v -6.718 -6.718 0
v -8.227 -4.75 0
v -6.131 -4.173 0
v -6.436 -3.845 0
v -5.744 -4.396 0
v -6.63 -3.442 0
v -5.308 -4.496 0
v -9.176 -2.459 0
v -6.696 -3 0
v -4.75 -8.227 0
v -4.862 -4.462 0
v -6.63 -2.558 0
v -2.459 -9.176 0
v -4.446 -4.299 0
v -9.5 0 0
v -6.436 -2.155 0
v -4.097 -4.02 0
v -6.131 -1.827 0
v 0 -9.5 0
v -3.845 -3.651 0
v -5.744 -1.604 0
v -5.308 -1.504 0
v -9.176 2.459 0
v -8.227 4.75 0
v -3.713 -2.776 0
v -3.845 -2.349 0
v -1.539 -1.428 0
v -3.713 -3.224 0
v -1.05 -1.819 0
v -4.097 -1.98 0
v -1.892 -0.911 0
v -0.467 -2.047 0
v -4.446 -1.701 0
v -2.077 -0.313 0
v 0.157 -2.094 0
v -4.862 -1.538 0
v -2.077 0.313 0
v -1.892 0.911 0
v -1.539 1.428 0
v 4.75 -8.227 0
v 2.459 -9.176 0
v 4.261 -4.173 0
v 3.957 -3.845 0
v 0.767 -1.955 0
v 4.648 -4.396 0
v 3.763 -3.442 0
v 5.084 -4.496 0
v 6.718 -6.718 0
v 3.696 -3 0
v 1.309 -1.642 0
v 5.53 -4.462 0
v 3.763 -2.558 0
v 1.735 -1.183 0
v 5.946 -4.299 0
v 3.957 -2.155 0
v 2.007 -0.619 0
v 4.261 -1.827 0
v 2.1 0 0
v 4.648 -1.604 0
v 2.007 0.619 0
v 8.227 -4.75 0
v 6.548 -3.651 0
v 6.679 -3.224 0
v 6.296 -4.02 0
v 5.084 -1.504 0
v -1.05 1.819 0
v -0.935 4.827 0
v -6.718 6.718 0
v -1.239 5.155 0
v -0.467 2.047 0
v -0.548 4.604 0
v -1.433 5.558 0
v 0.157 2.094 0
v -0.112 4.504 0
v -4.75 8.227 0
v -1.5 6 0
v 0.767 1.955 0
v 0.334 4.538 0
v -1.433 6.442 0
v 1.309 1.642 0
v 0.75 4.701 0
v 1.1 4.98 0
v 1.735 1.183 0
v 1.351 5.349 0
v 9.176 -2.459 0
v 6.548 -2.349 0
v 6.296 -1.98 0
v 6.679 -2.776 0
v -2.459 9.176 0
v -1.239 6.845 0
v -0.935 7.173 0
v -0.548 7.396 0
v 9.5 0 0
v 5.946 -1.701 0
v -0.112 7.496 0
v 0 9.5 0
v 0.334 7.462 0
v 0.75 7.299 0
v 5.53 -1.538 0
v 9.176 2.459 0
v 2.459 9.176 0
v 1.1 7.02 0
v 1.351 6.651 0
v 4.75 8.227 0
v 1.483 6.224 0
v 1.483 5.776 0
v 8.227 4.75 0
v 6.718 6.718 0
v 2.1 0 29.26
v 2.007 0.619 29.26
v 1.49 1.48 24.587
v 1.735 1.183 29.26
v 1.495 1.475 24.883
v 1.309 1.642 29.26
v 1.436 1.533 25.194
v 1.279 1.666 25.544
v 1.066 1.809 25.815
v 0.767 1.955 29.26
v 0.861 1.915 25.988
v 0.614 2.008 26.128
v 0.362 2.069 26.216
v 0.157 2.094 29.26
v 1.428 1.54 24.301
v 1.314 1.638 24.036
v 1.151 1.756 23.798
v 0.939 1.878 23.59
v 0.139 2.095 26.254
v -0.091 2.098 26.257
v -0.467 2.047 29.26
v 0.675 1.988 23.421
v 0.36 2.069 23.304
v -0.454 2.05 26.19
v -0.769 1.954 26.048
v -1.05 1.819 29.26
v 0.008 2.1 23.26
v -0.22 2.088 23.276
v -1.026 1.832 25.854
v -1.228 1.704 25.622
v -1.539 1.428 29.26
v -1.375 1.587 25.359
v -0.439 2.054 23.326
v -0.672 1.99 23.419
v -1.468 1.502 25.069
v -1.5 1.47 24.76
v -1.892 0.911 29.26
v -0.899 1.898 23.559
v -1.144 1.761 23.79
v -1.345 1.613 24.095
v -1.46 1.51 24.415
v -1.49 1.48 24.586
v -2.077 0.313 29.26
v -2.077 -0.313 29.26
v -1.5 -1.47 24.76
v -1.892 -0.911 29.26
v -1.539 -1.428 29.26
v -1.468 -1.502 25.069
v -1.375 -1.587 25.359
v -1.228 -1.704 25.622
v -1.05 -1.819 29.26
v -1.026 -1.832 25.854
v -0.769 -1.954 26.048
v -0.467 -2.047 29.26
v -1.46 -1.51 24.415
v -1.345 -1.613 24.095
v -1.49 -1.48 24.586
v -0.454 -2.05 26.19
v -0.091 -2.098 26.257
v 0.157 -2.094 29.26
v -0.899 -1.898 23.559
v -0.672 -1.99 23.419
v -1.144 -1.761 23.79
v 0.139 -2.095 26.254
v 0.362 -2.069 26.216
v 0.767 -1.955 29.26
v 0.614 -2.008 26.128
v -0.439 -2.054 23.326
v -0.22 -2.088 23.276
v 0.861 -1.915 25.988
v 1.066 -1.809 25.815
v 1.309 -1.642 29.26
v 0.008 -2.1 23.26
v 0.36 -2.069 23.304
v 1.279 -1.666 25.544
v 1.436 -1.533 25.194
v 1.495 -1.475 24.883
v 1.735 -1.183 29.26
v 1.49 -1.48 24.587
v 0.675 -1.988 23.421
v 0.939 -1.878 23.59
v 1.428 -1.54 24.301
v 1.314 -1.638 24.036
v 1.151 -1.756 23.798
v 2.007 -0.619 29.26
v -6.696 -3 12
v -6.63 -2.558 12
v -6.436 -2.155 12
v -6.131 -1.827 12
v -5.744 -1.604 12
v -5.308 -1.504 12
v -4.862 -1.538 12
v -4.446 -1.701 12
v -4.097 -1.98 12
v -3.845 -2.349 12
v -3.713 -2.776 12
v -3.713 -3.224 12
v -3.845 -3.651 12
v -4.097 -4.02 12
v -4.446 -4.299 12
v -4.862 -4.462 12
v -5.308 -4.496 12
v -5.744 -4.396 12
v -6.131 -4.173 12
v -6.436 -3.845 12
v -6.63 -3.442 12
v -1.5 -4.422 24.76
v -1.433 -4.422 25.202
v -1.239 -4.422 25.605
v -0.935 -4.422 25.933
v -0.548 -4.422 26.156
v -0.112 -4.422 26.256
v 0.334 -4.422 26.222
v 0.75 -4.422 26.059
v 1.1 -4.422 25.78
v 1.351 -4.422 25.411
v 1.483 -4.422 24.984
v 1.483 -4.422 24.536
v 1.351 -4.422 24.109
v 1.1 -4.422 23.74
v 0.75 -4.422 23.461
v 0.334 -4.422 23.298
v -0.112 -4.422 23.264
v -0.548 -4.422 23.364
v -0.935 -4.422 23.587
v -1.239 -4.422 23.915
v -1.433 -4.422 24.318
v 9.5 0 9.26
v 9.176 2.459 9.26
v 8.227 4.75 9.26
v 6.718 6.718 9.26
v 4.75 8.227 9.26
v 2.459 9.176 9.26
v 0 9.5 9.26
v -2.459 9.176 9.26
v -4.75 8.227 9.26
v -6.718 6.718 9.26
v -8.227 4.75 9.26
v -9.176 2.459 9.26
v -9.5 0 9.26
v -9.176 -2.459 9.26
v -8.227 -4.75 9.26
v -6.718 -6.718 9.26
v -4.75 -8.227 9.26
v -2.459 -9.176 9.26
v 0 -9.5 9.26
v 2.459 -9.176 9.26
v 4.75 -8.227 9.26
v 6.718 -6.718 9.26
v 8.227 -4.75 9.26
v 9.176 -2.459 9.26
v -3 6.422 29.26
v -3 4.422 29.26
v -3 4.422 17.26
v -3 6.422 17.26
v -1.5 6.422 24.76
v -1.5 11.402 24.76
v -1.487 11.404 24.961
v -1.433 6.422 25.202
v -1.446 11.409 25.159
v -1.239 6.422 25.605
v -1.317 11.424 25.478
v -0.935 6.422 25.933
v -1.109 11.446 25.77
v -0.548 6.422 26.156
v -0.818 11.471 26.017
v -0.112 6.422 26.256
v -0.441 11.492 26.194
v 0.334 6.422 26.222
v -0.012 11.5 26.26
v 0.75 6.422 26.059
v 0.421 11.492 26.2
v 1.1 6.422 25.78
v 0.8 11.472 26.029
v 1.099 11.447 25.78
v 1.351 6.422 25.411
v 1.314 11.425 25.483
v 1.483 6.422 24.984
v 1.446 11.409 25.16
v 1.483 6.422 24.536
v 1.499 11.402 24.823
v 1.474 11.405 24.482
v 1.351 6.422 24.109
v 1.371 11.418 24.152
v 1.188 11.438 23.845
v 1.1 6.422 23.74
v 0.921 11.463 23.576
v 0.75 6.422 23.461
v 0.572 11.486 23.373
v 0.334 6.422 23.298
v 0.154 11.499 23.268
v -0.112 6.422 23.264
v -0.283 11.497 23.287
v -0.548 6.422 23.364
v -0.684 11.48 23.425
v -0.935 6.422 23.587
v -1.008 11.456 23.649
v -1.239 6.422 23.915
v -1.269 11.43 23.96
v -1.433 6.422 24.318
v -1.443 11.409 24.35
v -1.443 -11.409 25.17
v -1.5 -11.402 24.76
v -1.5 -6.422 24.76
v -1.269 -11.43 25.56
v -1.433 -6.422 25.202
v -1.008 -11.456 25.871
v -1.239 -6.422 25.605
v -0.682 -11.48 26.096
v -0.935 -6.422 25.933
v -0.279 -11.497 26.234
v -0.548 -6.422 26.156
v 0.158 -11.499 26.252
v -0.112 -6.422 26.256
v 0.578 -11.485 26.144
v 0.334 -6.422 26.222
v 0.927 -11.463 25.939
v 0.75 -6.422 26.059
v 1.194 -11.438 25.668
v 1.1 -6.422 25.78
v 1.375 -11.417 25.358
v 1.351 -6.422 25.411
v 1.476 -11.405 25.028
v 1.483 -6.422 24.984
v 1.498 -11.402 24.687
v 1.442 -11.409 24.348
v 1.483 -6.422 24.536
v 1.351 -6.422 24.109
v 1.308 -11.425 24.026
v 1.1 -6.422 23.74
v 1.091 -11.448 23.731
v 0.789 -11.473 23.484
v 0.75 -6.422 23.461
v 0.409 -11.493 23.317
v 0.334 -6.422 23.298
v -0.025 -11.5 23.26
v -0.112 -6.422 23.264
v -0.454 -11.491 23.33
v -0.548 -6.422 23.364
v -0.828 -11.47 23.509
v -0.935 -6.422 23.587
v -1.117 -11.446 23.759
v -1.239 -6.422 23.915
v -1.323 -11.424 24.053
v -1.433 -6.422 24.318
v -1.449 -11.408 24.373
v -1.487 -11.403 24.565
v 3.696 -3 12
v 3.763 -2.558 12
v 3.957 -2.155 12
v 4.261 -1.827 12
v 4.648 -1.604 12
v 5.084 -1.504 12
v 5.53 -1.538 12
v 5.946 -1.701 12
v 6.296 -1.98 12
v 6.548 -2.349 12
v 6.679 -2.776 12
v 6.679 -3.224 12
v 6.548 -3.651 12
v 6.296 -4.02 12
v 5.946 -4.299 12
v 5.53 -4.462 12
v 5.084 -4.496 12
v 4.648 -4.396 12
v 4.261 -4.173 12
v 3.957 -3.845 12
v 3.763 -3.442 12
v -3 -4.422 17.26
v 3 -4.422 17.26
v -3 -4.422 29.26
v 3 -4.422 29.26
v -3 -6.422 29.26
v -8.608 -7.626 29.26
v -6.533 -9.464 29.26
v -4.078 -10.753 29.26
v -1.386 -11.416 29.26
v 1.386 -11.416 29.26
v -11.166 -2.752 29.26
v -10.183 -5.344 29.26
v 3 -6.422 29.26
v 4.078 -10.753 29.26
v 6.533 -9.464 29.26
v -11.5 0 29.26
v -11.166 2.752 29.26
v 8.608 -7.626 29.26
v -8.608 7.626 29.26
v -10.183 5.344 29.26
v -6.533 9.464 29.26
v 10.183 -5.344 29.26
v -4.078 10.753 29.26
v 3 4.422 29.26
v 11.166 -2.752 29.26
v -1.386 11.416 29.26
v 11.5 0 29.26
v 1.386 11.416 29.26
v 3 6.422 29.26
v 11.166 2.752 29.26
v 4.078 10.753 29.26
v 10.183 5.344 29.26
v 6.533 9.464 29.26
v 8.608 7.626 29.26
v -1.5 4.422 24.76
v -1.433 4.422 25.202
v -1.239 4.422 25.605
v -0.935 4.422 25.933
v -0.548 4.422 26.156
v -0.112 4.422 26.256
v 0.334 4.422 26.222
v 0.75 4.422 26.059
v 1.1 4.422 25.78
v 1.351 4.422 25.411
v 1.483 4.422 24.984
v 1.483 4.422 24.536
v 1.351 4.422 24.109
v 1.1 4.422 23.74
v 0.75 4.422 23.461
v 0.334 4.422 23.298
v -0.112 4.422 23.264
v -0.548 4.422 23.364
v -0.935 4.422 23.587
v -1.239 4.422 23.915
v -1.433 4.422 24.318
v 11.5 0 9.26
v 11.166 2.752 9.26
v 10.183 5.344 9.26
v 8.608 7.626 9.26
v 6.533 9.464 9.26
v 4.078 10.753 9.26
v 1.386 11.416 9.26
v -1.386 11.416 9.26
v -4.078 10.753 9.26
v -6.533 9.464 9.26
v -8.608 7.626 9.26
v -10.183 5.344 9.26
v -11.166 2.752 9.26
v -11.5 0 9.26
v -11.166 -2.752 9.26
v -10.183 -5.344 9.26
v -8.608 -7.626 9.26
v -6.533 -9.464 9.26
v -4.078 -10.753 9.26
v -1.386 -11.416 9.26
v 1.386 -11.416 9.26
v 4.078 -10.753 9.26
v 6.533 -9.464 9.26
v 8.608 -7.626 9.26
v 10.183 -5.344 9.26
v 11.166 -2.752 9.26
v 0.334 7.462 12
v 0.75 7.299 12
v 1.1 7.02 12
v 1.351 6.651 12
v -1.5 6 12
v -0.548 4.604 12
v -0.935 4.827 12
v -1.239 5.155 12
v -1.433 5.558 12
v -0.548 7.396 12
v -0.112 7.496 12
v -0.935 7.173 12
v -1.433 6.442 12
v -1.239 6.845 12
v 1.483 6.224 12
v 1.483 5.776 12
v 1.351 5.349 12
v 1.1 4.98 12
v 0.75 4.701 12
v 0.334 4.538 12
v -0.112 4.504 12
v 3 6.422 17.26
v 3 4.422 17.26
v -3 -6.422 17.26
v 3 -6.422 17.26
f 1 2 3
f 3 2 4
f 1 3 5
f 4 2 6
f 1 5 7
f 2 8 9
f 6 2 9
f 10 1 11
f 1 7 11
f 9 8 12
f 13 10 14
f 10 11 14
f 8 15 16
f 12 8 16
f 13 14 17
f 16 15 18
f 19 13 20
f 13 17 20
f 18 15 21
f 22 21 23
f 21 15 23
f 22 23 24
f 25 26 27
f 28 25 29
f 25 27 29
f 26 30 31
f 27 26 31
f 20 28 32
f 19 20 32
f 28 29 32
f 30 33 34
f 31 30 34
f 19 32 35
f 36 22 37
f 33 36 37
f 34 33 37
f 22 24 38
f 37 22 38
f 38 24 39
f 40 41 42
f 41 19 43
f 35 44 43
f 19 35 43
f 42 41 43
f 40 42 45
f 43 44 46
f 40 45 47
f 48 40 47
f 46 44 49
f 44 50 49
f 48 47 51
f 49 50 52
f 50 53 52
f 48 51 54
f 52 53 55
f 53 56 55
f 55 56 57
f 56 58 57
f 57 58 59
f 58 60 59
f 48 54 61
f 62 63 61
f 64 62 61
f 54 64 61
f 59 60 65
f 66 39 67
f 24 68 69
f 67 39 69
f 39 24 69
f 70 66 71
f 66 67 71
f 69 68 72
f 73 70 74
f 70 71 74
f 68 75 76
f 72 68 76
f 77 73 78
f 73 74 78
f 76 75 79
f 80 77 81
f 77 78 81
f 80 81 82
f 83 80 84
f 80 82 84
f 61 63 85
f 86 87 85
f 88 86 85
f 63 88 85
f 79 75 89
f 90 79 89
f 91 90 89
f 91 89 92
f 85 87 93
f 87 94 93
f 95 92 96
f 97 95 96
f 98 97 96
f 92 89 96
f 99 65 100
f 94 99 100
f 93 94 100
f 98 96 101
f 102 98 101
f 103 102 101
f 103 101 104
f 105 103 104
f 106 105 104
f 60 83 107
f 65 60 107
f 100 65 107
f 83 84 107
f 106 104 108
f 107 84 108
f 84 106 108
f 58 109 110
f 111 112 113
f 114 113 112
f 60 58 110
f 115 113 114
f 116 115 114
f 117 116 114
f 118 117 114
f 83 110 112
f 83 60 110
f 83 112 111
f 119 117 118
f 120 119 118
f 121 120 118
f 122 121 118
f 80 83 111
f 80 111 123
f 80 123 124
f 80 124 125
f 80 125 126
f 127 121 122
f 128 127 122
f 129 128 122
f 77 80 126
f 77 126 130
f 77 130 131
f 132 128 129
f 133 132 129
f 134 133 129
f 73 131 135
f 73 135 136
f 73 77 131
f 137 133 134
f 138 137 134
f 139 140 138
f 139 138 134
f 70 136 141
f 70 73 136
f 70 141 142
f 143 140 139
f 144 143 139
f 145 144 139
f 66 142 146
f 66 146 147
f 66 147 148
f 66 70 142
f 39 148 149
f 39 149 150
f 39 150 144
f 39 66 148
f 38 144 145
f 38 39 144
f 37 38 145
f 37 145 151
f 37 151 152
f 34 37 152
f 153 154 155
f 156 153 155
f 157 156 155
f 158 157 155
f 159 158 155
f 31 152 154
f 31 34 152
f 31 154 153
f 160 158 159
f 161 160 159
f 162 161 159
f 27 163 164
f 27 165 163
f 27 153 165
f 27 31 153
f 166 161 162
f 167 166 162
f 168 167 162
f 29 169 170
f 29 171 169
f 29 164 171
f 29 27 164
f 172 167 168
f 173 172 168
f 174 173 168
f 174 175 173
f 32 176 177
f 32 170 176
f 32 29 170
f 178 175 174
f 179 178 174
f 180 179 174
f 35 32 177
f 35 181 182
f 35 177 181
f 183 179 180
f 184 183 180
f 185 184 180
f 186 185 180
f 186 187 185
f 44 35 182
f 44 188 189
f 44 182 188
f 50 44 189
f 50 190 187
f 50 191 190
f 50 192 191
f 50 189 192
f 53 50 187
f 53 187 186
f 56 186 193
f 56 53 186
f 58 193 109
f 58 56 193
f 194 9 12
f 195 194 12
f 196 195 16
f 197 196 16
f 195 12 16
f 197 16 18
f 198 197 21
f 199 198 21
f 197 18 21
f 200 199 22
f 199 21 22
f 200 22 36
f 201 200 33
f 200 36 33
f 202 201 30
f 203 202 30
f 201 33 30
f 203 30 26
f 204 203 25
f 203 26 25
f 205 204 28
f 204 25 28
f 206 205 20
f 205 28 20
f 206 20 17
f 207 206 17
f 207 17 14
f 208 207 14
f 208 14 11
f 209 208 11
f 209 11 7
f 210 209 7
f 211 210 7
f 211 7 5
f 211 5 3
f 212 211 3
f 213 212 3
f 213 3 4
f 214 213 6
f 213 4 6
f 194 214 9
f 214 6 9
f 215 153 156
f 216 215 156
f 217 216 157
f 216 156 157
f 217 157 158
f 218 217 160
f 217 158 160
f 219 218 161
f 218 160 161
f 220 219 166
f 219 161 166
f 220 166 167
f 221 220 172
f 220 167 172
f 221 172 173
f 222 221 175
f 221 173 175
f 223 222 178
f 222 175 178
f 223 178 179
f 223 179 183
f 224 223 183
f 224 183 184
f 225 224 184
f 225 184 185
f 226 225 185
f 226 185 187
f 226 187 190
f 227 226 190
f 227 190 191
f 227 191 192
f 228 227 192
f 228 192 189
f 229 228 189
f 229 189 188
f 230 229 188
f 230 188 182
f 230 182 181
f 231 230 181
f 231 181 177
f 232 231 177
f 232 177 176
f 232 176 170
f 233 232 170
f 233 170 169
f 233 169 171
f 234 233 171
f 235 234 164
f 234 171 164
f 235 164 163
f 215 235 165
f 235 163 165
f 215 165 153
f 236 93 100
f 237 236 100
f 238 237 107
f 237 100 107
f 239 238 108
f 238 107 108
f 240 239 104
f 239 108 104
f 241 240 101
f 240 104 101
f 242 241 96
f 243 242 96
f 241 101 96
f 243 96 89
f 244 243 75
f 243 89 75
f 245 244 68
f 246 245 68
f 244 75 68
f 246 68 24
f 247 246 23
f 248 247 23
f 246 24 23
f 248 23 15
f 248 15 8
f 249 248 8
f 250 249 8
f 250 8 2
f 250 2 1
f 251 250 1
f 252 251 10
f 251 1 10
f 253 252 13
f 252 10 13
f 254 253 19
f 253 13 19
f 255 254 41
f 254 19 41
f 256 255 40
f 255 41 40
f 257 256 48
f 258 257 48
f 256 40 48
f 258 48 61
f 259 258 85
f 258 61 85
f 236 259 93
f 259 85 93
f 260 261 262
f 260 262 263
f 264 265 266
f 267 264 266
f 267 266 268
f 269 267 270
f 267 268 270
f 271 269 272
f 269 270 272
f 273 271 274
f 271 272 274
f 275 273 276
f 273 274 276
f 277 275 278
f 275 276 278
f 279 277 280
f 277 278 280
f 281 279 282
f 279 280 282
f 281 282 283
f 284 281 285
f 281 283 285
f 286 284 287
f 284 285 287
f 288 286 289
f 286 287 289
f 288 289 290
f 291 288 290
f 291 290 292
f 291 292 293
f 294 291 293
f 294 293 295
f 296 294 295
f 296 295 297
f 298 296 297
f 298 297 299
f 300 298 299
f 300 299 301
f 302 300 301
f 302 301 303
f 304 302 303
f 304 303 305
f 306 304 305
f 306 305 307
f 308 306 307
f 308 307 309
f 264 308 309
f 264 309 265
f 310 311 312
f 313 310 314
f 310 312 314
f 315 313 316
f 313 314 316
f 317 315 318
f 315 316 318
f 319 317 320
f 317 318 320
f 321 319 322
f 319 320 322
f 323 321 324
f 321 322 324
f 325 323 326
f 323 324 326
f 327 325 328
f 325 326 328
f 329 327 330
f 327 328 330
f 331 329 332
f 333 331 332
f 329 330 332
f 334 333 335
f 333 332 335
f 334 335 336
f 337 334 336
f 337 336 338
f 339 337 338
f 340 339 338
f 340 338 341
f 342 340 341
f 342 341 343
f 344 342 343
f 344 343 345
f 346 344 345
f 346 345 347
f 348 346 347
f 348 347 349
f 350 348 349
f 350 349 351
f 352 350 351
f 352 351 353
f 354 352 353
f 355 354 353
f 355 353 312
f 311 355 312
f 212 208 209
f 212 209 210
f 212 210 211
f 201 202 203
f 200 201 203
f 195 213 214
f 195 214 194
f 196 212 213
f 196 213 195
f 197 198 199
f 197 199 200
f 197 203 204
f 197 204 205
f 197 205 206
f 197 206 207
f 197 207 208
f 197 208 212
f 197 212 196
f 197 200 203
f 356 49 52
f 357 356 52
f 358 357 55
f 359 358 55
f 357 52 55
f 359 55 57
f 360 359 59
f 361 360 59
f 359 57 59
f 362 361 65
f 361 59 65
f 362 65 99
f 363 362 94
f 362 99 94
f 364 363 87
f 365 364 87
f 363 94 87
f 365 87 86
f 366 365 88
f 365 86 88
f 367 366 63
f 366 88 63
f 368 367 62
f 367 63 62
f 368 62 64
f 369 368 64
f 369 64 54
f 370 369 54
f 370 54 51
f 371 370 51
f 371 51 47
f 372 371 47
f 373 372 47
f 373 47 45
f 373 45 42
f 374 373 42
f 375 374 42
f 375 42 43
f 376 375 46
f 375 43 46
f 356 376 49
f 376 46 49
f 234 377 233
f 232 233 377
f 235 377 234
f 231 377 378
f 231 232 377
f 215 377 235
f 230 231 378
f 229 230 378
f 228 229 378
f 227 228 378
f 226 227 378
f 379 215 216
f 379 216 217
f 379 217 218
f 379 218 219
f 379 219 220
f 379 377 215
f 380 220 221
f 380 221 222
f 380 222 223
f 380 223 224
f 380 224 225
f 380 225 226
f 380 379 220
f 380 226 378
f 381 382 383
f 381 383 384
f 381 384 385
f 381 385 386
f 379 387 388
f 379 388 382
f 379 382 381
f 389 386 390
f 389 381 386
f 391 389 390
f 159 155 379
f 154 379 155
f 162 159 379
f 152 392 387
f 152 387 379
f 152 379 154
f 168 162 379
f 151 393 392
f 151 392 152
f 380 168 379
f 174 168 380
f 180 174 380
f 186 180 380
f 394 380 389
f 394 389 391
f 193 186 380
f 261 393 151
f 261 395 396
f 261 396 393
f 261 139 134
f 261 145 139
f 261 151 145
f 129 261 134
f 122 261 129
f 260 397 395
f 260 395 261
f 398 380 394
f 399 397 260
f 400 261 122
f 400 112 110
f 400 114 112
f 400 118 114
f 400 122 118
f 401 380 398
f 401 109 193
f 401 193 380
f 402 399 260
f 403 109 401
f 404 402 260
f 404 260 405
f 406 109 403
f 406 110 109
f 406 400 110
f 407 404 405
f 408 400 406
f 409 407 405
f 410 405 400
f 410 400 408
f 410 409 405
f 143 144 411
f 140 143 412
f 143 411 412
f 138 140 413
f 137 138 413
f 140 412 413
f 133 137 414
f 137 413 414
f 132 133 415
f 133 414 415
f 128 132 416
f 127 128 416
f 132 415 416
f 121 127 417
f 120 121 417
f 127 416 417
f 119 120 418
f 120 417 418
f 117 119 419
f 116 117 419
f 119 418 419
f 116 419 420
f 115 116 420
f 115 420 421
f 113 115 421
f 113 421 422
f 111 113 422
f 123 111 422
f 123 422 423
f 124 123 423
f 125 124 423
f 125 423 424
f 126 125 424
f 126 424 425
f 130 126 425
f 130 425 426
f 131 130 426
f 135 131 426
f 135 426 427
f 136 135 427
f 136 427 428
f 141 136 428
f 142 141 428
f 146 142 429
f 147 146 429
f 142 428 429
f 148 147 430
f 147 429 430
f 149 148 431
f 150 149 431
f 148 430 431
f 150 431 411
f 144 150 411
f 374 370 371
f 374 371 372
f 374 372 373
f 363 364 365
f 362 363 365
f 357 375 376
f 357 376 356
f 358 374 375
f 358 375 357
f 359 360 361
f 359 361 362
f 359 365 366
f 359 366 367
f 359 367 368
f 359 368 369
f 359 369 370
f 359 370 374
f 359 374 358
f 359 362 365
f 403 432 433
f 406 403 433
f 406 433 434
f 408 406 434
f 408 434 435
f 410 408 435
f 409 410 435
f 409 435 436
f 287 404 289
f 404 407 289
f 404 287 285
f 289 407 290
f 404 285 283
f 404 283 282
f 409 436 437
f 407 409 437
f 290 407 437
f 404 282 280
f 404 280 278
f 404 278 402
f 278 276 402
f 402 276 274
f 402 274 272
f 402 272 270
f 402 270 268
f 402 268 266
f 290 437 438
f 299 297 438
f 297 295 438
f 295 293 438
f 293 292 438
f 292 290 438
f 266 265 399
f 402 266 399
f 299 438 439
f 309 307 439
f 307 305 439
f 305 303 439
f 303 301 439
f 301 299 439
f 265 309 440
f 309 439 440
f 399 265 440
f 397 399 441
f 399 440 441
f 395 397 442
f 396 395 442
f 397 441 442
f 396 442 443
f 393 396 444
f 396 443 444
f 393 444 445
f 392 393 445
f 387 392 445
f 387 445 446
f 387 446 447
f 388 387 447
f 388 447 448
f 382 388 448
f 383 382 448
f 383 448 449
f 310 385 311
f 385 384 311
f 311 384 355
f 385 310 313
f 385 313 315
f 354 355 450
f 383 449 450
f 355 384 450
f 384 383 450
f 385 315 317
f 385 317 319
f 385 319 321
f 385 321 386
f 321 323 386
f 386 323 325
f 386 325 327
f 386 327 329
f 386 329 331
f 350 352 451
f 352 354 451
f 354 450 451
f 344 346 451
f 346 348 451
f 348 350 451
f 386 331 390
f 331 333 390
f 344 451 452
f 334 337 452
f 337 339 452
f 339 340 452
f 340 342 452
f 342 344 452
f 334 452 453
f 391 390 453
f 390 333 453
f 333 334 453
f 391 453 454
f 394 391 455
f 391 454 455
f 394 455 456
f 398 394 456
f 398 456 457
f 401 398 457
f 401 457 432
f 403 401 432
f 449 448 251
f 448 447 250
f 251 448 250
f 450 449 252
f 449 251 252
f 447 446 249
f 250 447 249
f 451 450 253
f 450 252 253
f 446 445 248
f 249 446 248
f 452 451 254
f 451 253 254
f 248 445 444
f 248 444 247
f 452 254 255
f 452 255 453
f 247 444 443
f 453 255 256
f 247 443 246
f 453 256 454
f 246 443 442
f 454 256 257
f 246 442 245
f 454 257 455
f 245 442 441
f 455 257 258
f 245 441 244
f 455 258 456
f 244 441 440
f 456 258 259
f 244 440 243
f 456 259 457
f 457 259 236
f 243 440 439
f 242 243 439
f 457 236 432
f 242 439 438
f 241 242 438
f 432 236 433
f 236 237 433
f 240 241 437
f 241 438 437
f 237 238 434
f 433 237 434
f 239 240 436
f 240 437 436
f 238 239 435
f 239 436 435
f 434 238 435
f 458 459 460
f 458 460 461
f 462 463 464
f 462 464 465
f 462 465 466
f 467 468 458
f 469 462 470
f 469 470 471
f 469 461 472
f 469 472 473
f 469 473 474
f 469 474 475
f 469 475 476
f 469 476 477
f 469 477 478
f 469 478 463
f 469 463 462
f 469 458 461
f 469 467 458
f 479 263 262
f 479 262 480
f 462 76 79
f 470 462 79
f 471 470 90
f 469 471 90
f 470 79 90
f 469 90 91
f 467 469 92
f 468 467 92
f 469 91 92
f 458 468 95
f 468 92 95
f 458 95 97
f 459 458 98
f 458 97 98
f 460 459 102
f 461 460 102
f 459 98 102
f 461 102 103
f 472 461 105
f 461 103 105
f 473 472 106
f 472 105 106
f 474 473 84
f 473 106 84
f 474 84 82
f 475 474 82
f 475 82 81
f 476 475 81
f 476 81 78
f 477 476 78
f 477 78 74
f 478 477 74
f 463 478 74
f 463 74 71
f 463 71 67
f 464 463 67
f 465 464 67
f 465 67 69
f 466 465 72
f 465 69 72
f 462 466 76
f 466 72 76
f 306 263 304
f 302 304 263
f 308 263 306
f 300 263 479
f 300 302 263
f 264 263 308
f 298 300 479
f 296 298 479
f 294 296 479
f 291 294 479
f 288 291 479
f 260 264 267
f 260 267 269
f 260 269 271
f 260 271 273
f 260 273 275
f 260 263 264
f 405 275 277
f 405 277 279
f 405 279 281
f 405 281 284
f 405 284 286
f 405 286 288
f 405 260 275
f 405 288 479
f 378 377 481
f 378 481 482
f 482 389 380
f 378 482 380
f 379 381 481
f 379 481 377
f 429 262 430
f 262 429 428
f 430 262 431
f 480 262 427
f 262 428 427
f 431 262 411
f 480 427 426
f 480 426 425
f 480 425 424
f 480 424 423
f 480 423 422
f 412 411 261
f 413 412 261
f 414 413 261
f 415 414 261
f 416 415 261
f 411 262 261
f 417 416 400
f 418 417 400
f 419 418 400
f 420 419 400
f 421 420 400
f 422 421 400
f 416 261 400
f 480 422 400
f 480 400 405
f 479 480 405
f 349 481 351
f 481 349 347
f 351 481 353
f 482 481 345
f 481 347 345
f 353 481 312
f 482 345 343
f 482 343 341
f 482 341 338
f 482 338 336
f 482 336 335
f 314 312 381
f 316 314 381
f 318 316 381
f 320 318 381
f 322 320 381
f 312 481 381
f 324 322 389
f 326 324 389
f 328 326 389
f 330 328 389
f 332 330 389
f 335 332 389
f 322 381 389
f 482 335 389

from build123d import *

# Parameters (mm, degrees)
SKETCH1_R                 = 9.5
SKETCH1_R_2               = 2.1
BOSS_EXTRUDE1_DEPTH       = 9.26
BOSS_EXTRUDE2_OUTLINE_R   = 11.5
BOSS_EXTRUDE2_OUTLINE_R_2 = 2.1
BOSS_EXTRUDE2_DEPTH       = 20
SKETCH3_W                 = 6
SKETCH3_H                 = 2
CUT_EXTRUDE1_DEPTH        = 12
SKETCH4_R                 = 1.5
CUT_EXTRUDE2_DEPTH        = 39.953788006
SKETCH5_R                 = 1.5
CUT_EXTRUDE3_DEPTH        = 12


# Read off the part's stored shape, not the designer's step: Boss-Extrude2
with BuildPart() as part:
    # Sketch1 → Boss-Extrude1 (new body)
    with BuildSketch(Plane.XY):
        Circle(SKETCH1_R)
        Circle(SKETCH1_R_2, mode=Mode.SUBTRACT)
    extrude(amount=BOSS_EXTRUDE1_DEPTH)

    # Boss-Extrude2 outline → Boss-Extrude2 (add)
    with BuildSketch(Plane.XY.offset(9.26)):
        Circle(BOSS_EXTRUDE2_OUTLINE_R)
        Circle(BOSS_EXTRUDE2_OUTLINE_R_2, mode=Mode.SUBTRACT)
    extrude(amount=BOSS_EXTRUDE2_DEPTH)

    # Sketch3 → Cut-Extrude1 (cut)
    with BuildSketch(Plane.XY.offset(29.26)):
        with Locations((0, 5.422033923)):
            Rectangle(SKETCH3_W, SKETCH3_H)
        with Locations((0, -5.422033923)):
            Rectangle(SKETCH3_W, SKETCH3_H)
    extrude(amount=-CUT_EXTRUDE1_DEPTH, mode=Mode.SUBTRACT)

    # Sketch4 → Cut-Extrude2 (cut, through all)
    with BuildSketch(Plane(origin=(0, 11.5, 0), x_dir=(1, 0, 0), z_dir=(0, 1, 0))):
        with Locations(Location((0, -24.76, 0), (0, 0, 180))):
            Circle(SKETCH4_R)
    extrude(amount=-CUT_EXTRUDE2_DEPTH, mode=Mode.SUBTRACT)

    # Sketch5 → Cut-Extrude3 (cut)
    with BuildSketch(Plane(origin=(0, 0, 0), x_dir=(-1, 0, 0), z_dir=(0, 0, -1))):
        with Locations((0, 6)):
            Circle(SKETCH5_R)
        with Locations((5.196152423, -3)):
            Circle(SKETCH5_R)
        with Locations((-5.196152423, -3)):
            Circle(SKETCH5_R)
    extrude(amount=-CUT_EXTRUDE3_DEPTH, mode=Mode.SUBTRACT)


solid = part.part
